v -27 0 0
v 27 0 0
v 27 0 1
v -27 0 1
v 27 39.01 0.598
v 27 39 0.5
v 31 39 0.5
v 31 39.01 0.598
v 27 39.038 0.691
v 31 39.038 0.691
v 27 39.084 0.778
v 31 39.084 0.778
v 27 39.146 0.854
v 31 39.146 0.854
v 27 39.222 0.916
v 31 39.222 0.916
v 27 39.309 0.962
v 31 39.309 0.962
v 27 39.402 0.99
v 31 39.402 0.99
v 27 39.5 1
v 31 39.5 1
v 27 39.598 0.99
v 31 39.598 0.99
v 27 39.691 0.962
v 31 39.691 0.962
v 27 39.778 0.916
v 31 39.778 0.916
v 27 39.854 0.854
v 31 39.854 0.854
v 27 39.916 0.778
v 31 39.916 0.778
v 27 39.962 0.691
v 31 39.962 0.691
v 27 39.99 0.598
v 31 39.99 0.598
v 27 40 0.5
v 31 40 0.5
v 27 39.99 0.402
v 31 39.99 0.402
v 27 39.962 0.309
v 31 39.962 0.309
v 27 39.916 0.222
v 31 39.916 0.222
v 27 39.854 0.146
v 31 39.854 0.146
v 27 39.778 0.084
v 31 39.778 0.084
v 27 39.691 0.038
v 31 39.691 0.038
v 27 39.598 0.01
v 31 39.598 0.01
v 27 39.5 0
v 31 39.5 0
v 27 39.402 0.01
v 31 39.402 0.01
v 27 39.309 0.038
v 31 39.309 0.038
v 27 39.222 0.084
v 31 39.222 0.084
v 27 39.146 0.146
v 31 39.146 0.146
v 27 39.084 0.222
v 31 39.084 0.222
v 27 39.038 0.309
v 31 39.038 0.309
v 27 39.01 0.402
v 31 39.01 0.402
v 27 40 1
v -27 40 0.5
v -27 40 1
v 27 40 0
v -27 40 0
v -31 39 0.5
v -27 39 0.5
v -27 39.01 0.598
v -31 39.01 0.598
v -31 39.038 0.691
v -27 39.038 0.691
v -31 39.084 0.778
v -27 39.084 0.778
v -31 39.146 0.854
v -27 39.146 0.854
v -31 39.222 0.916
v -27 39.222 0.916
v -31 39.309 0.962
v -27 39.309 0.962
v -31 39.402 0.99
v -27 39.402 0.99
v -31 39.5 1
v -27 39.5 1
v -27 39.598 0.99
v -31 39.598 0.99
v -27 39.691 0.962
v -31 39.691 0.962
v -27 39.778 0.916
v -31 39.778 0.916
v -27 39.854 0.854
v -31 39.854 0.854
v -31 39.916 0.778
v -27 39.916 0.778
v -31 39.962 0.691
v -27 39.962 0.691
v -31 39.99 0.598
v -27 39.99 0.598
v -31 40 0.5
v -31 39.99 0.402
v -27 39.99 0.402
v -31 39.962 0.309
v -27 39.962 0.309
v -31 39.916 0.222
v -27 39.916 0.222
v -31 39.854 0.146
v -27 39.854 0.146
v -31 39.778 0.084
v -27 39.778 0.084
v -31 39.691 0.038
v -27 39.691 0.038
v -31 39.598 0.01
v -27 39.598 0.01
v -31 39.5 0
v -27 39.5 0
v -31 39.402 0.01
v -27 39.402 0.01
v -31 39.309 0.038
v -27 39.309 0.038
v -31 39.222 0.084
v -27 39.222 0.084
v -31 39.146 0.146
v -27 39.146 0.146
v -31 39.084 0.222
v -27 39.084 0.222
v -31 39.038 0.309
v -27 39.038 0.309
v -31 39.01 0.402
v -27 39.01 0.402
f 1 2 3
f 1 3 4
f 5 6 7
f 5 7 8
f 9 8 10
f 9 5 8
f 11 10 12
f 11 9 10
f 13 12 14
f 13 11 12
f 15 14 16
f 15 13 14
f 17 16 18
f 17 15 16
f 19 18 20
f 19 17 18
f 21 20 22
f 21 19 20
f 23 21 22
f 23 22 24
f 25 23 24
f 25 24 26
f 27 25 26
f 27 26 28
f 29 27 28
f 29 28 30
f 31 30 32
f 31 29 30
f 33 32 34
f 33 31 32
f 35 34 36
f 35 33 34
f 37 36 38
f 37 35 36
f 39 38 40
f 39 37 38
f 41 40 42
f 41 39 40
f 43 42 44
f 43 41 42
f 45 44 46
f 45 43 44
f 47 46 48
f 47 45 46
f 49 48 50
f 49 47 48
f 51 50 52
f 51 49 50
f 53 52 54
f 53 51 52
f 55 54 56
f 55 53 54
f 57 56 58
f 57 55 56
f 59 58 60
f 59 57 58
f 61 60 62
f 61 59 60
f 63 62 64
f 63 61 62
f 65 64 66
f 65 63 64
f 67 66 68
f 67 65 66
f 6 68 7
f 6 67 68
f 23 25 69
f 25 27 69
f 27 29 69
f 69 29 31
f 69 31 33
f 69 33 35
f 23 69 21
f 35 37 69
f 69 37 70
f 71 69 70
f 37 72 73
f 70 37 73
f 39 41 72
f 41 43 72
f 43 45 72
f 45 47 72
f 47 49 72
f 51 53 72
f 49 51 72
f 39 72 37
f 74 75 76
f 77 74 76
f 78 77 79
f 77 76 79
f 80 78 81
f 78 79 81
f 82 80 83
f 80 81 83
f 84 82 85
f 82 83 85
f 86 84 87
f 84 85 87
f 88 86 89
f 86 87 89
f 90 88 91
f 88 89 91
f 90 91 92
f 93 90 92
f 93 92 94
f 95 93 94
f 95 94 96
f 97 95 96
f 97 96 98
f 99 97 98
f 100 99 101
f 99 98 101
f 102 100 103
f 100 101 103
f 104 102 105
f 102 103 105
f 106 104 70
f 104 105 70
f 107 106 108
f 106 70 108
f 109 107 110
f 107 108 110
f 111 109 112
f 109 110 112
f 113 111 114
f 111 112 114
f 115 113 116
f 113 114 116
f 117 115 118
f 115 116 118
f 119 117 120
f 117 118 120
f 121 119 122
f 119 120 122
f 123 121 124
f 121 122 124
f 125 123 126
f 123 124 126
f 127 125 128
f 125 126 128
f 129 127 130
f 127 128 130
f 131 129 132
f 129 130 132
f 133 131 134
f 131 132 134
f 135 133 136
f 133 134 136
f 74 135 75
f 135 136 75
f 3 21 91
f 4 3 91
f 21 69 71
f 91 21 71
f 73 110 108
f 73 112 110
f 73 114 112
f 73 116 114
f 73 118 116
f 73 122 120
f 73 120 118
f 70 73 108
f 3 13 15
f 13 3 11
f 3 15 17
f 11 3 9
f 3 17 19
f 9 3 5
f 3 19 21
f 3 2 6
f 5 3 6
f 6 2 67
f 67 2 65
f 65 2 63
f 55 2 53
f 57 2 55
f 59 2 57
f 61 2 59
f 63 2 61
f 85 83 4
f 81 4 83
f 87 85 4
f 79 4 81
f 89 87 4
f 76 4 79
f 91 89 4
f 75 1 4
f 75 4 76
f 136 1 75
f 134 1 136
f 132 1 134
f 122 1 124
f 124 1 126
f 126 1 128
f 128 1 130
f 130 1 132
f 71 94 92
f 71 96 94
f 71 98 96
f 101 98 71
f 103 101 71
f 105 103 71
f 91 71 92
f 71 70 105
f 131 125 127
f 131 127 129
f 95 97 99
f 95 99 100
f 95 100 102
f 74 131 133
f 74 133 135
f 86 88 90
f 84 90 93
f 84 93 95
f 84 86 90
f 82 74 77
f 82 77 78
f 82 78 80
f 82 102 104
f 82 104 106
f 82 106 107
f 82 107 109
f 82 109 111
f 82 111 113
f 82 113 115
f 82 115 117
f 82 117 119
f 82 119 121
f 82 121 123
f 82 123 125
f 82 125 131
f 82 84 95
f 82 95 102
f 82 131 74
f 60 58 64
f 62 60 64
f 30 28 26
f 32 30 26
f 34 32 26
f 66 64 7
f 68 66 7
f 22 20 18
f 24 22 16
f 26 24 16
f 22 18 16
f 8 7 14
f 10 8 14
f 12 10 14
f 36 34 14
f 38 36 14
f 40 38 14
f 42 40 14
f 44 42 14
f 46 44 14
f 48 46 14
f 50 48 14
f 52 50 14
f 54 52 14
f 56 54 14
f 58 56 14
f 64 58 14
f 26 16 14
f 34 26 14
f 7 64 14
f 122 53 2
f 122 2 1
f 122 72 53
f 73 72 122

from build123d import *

# Parameters (mm, degrees)
SKETCH_W     = 27
SKETCH_H     = 40
PAD_DEPTH    = 1
SKETCH001_R  = 0.5
PAD001_DEPTH = 4


with BuildPart() as part:
    # Sketch → Pad (new body)
    with BuildSketch(Plane.XY):
        with Locations((-13.5, 20)):
            Rectangle(SKETCH_W, SKETCH_H)
    extrude(amount=PAD_DEPTH)

    # Sketch001 (on Face4 of Pad) → Pad001 (join)
    with BuildSketch(Plane(origin=(-27, 0, 0), x_dir=(0, -1, 0), z_dir=(-1, 0, 0))):
        with Locations((-39.5, 0.5)):
            Circle(SKETCH001_R)
    extrude(amount=PAD001_DEPTH)

    # Mirrored: part across YZ


with BuildPart() as part_1:
    add(part.part)
    add(part.part.mirror(Plane.YZ))


solid = part_1.part
